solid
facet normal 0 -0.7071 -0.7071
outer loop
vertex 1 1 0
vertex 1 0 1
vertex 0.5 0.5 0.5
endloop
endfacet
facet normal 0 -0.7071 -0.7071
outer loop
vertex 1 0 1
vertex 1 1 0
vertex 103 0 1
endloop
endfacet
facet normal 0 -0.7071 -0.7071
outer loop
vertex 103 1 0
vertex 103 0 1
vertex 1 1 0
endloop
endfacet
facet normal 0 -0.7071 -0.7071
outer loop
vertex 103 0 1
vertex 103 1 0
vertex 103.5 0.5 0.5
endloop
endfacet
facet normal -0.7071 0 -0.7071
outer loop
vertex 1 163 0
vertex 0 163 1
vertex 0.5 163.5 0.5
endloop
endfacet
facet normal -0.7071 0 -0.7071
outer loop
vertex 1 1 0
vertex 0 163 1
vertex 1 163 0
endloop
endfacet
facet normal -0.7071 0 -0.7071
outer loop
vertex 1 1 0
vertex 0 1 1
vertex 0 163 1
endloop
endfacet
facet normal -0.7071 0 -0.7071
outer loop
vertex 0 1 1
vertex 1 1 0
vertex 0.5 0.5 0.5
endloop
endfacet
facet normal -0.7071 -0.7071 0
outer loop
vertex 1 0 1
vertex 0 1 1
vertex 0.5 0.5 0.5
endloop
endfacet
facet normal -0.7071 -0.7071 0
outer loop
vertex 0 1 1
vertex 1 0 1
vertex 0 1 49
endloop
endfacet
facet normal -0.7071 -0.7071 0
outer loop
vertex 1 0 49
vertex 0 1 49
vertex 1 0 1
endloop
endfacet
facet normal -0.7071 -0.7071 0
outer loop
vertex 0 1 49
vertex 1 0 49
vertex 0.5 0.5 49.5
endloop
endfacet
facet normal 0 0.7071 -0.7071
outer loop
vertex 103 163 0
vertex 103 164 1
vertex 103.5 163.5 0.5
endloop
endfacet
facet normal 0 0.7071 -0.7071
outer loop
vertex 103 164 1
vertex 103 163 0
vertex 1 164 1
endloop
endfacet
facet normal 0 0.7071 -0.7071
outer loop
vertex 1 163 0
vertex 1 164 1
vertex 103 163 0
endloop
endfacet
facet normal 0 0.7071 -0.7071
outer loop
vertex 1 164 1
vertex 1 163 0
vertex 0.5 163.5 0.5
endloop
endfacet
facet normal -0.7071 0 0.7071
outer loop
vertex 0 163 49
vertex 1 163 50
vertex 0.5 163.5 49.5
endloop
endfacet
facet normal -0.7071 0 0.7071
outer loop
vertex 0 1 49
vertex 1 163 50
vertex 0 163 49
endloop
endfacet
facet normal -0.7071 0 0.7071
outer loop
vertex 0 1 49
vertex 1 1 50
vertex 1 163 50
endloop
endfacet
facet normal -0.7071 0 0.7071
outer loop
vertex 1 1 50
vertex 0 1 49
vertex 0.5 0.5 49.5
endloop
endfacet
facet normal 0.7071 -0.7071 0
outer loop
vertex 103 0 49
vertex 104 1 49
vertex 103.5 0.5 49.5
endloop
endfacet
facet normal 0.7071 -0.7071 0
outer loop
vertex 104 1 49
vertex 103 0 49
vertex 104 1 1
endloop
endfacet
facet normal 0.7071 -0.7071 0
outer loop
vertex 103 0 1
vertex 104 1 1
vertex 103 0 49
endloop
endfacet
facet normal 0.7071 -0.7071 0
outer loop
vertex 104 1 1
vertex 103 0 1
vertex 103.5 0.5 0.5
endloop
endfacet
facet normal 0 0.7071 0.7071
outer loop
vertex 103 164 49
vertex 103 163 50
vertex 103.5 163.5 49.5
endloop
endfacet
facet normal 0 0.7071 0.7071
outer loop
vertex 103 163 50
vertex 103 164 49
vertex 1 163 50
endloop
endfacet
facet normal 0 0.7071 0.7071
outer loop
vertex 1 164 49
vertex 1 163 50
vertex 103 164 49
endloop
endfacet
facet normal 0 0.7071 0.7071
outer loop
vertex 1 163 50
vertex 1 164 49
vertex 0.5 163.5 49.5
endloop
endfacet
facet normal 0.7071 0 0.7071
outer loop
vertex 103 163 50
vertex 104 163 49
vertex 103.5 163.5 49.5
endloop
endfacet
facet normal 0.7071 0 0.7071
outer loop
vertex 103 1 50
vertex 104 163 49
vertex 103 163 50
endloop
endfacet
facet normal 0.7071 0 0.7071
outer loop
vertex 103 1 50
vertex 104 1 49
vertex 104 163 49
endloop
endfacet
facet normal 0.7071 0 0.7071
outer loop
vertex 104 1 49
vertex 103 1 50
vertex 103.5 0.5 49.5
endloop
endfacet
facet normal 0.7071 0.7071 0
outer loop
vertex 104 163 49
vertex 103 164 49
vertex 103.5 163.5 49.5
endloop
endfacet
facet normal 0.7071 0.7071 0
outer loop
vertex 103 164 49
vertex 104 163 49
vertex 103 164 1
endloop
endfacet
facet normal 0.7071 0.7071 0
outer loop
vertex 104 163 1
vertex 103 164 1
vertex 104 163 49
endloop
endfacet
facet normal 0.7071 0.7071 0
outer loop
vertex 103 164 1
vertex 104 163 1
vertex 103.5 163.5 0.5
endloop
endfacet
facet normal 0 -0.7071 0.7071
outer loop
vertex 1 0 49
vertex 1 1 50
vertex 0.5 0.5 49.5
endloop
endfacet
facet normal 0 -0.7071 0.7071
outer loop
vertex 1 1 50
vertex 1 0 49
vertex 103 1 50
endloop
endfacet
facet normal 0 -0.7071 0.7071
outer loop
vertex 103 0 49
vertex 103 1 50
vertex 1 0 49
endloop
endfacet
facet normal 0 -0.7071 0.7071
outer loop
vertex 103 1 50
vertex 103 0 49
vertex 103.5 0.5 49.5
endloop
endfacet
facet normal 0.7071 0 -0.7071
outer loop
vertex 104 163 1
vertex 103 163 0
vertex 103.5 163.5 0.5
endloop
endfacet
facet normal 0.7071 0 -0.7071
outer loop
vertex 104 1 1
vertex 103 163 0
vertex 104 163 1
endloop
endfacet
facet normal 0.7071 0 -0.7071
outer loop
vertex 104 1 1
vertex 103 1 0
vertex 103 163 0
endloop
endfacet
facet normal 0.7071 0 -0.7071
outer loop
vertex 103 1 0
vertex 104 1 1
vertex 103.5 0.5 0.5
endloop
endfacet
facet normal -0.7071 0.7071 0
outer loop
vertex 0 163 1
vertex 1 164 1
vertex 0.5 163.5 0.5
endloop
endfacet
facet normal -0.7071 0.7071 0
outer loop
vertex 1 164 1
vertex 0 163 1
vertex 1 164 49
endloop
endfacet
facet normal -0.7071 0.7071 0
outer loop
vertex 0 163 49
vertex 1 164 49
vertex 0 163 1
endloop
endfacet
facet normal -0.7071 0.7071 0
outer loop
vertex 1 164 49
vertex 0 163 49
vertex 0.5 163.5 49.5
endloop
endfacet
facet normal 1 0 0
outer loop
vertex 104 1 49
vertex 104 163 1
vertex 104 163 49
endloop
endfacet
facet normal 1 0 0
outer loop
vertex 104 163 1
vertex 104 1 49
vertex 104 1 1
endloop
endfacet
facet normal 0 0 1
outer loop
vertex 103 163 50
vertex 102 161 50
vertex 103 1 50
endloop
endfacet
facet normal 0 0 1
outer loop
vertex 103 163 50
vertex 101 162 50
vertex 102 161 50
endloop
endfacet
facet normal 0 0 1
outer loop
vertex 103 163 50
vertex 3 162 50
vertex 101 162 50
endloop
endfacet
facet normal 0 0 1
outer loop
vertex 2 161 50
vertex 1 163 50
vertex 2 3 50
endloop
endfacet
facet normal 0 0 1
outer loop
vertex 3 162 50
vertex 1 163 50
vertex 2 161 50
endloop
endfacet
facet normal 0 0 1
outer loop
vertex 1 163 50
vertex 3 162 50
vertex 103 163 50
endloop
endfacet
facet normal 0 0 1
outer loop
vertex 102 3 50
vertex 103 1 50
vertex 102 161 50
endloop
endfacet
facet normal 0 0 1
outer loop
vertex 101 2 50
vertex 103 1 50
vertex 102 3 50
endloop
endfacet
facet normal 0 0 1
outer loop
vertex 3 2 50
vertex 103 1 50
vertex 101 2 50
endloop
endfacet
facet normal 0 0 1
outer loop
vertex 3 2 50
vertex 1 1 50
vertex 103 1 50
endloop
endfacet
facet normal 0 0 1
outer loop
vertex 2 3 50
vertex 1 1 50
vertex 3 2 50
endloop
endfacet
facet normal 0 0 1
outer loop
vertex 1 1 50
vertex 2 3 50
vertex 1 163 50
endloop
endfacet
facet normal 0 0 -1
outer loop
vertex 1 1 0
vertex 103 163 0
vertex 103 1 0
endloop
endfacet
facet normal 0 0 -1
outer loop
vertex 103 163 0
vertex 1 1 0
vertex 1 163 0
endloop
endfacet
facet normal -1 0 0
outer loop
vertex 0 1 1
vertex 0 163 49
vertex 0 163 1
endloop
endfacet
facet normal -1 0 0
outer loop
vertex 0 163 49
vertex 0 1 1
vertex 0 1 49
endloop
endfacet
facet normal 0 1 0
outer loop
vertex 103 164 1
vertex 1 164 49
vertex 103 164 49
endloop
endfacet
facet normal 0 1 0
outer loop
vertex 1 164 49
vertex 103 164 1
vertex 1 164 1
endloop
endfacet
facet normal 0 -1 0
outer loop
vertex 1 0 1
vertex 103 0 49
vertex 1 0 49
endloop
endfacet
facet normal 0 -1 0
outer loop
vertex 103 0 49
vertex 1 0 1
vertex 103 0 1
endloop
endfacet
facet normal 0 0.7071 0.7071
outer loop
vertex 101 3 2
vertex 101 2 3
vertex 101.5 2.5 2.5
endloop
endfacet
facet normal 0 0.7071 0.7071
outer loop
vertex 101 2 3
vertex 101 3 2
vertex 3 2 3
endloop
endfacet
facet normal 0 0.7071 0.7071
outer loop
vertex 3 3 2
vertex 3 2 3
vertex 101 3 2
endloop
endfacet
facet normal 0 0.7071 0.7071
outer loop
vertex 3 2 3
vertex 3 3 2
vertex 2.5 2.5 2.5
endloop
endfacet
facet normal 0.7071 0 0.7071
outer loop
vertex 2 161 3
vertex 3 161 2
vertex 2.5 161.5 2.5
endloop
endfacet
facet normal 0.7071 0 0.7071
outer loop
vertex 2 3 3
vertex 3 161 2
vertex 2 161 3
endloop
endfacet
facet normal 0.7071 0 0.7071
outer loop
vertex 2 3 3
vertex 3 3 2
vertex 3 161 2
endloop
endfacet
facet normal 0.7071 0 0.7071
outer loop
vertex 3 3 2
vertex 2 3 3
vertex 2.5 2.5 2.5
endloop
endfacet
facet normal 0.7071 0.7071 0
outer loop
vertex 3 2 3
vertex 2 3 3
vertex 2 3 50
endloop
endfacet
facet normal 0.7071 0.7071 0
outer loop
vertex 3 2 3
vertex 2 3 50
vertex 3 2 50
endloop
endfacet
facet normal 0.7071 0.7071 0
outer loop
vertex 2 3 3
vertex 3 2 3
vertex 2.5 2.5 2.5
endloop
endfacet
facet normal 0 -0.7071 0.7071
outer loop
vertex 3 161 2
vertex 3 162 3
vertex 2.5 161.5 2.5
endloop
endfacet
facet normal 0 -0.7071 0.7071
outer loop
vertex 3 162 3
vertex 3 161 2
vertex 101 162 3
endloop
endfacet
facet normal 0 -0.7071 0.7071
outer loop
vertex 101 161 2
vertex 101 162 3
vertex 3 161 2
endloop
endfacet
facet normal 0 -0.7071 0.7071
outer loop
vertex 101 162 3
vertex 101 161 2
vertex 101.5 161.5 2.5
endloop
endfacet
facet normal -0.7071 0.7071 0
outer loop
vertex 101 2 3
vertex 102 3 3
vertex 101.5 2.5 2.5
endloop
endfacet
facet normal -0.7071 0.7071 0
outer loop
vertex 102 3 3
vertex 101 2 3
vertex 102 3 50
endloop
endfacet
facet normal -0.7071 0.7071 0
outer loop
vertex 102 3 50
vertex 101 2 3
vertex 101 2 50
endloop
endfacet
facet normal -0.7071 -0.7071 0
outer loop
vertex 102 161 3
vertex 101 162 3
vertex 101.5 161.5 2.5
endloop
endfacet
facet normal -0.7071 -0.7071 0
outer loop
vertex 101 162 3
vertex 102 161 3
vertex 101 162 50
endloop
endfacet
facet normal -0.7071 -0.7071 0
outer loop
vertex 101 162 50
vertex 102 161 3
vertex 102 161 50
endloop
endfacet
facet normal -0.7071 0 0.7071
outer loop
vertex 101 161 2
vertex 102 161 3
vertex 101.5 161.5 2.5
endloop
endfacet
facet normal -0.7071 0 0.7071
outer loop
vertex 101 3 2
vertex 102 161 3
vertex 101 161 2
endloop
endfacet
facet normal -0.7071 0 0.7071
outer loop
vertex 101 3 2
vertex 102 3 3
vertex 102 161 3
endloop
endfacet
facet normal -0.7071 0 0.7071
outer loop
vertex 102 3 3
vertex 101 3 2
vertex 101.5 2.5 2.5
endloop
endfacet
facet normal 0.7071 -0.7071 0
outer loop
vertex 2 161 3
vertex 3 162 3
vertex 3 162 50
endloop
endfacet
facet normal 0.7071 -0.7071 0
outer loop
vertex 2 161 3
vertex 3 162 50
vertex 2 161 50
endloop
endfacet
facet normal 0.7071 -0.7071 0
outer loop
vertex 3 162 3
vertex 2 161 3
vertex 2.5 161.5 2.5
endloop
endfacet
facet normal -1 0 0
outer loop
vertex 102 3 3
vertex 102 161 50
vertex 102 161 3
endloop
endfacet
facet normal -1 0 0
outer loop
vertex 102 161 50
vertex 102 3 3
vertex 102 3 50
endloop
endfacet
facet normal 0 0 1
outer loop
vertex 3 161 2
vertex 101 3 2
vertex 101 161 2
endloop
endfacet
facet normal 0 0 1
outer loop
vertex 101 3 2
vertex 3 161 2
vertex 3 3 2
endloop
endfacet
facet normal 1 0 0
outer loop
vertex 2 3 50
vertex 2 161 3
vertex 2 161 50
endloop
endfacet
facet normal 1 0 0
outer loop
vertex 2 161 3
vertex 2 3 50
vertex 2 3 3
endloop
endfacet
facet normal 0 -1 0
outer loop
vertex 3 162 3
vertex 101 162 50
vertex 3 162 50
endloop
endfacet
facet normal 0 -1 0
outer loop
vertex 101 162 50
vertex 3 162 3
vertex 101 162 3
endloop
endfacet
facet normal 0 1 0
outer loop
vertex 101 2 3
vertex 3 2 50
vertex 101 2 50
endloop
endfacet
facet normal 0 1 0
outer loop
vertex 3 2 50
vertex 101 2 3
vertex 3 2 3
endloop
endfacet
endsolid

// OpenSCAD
//CHAMFERING:
//
//https://github.com/SebiTimeWaster/Chamfers-for-OpenSCAD/blob/master/Chamfer.scad


inner_w=100;
inner_h=160;
bottom_part_height=50;
wall_thickness =2;


difference(){
chamferCube([inner_w+2*wall_thickness,inner_h+2*wall_thickness, bottom_part_height]
    );
translate([wall_thickness,wall_thickness,wall_thickness])
    chamferCube([inner_w,inner_h, bottom_part_height]);
}






module chamferCube(size, chamfers = [undef, undef, undef], ch = 1, ph1 = 1, ph2 = undef, ph3 = undef, ph4 = undef, sizeX = undef, sizeY = undef, sizeZ = undef, chamferHeight = undef, chamferX = undef, chamferY = undef, chamferZ = undef) {
    if(size[0]) {
        chamferCubeImpl(size[0], size[1], size[2], ch, chamfers[0], chamfers[1], chamfers[2]);
    } else {
        // keep backwards compatibility
        size     = (sizeX == undef) ? size : sizeX;
        chamfers = (sizeY == undef) ? chamfers : sizeY;
        ch       = (sizeZ == undef) ? ch : sizeZ;
        ph1      = (chamferHeight == undef) ? ph1 : chamferHeight;
        ph2      = (chamferX == undef) ? ph2 : chamferX;
        ph3      = (chamferY == undef) ? ph3 : chamferY;
        ph4      = (chamferZ == undef) ? ph4 : chamferZ;

        chamferCubeImpl(size, chamfers, ch, ph1, ph2, ph3, ph4);
    }
}

module chamferCubeImpl(sizeX, sizeY, sizeZ, chamferHeight, chamferX, chamferY, chamferZ) {
    chamferX = (chamferX == undef) ? [1, 1, 1, 1] : chamferX;
    chamferY = (chamferY == undef) ? [1, 1, 1, 1] : chamferY;
    chamferZ = (chamferZ == undef) ? [1, 1, 1, 1] : chamferZ;
    chamferCLength = sqrt(chamferHeight * chamferHeight * 2);

    difference() {
        cube([sizeX, sizeY, sizeZ]);
        for(x = [0 : 3]) {
            chamferSide1 = min(x, 1) - floor(x / 3); // 0 1 1 0
            chamferSide2 = floor(x / 2); // 0 0 1 1
            if(chamferX[x]) {
                translate([-0.1, chamferSide1 * sizeY, -chamferHeight + chamferSide2 * sizeZ])
                rotate([45, 0, 0])
                cube([sizeX + 0.2, chamferCLength, chamferCLength]);
            }
            if(chamferY[x]) {
                translate([-chamferHeight + chamferSide2 * sizeX, -0.1, chamferSide1 * sizeZ])
                rotate([0, 45, 0])
                cube([chamferCLength, sizeY + 0.2, chamferCLength]);
            }
            if(chamferZ[x]) {
                translate([chamferSide1 * sizeX, -chamferHeight + chamferSide2 * sizeY, -0.1])
                rotate([0, 0, 45])
                cube([chamferCLength, chamferCLength, sizeZ + 0.2]);
            }
        }
    }
}
